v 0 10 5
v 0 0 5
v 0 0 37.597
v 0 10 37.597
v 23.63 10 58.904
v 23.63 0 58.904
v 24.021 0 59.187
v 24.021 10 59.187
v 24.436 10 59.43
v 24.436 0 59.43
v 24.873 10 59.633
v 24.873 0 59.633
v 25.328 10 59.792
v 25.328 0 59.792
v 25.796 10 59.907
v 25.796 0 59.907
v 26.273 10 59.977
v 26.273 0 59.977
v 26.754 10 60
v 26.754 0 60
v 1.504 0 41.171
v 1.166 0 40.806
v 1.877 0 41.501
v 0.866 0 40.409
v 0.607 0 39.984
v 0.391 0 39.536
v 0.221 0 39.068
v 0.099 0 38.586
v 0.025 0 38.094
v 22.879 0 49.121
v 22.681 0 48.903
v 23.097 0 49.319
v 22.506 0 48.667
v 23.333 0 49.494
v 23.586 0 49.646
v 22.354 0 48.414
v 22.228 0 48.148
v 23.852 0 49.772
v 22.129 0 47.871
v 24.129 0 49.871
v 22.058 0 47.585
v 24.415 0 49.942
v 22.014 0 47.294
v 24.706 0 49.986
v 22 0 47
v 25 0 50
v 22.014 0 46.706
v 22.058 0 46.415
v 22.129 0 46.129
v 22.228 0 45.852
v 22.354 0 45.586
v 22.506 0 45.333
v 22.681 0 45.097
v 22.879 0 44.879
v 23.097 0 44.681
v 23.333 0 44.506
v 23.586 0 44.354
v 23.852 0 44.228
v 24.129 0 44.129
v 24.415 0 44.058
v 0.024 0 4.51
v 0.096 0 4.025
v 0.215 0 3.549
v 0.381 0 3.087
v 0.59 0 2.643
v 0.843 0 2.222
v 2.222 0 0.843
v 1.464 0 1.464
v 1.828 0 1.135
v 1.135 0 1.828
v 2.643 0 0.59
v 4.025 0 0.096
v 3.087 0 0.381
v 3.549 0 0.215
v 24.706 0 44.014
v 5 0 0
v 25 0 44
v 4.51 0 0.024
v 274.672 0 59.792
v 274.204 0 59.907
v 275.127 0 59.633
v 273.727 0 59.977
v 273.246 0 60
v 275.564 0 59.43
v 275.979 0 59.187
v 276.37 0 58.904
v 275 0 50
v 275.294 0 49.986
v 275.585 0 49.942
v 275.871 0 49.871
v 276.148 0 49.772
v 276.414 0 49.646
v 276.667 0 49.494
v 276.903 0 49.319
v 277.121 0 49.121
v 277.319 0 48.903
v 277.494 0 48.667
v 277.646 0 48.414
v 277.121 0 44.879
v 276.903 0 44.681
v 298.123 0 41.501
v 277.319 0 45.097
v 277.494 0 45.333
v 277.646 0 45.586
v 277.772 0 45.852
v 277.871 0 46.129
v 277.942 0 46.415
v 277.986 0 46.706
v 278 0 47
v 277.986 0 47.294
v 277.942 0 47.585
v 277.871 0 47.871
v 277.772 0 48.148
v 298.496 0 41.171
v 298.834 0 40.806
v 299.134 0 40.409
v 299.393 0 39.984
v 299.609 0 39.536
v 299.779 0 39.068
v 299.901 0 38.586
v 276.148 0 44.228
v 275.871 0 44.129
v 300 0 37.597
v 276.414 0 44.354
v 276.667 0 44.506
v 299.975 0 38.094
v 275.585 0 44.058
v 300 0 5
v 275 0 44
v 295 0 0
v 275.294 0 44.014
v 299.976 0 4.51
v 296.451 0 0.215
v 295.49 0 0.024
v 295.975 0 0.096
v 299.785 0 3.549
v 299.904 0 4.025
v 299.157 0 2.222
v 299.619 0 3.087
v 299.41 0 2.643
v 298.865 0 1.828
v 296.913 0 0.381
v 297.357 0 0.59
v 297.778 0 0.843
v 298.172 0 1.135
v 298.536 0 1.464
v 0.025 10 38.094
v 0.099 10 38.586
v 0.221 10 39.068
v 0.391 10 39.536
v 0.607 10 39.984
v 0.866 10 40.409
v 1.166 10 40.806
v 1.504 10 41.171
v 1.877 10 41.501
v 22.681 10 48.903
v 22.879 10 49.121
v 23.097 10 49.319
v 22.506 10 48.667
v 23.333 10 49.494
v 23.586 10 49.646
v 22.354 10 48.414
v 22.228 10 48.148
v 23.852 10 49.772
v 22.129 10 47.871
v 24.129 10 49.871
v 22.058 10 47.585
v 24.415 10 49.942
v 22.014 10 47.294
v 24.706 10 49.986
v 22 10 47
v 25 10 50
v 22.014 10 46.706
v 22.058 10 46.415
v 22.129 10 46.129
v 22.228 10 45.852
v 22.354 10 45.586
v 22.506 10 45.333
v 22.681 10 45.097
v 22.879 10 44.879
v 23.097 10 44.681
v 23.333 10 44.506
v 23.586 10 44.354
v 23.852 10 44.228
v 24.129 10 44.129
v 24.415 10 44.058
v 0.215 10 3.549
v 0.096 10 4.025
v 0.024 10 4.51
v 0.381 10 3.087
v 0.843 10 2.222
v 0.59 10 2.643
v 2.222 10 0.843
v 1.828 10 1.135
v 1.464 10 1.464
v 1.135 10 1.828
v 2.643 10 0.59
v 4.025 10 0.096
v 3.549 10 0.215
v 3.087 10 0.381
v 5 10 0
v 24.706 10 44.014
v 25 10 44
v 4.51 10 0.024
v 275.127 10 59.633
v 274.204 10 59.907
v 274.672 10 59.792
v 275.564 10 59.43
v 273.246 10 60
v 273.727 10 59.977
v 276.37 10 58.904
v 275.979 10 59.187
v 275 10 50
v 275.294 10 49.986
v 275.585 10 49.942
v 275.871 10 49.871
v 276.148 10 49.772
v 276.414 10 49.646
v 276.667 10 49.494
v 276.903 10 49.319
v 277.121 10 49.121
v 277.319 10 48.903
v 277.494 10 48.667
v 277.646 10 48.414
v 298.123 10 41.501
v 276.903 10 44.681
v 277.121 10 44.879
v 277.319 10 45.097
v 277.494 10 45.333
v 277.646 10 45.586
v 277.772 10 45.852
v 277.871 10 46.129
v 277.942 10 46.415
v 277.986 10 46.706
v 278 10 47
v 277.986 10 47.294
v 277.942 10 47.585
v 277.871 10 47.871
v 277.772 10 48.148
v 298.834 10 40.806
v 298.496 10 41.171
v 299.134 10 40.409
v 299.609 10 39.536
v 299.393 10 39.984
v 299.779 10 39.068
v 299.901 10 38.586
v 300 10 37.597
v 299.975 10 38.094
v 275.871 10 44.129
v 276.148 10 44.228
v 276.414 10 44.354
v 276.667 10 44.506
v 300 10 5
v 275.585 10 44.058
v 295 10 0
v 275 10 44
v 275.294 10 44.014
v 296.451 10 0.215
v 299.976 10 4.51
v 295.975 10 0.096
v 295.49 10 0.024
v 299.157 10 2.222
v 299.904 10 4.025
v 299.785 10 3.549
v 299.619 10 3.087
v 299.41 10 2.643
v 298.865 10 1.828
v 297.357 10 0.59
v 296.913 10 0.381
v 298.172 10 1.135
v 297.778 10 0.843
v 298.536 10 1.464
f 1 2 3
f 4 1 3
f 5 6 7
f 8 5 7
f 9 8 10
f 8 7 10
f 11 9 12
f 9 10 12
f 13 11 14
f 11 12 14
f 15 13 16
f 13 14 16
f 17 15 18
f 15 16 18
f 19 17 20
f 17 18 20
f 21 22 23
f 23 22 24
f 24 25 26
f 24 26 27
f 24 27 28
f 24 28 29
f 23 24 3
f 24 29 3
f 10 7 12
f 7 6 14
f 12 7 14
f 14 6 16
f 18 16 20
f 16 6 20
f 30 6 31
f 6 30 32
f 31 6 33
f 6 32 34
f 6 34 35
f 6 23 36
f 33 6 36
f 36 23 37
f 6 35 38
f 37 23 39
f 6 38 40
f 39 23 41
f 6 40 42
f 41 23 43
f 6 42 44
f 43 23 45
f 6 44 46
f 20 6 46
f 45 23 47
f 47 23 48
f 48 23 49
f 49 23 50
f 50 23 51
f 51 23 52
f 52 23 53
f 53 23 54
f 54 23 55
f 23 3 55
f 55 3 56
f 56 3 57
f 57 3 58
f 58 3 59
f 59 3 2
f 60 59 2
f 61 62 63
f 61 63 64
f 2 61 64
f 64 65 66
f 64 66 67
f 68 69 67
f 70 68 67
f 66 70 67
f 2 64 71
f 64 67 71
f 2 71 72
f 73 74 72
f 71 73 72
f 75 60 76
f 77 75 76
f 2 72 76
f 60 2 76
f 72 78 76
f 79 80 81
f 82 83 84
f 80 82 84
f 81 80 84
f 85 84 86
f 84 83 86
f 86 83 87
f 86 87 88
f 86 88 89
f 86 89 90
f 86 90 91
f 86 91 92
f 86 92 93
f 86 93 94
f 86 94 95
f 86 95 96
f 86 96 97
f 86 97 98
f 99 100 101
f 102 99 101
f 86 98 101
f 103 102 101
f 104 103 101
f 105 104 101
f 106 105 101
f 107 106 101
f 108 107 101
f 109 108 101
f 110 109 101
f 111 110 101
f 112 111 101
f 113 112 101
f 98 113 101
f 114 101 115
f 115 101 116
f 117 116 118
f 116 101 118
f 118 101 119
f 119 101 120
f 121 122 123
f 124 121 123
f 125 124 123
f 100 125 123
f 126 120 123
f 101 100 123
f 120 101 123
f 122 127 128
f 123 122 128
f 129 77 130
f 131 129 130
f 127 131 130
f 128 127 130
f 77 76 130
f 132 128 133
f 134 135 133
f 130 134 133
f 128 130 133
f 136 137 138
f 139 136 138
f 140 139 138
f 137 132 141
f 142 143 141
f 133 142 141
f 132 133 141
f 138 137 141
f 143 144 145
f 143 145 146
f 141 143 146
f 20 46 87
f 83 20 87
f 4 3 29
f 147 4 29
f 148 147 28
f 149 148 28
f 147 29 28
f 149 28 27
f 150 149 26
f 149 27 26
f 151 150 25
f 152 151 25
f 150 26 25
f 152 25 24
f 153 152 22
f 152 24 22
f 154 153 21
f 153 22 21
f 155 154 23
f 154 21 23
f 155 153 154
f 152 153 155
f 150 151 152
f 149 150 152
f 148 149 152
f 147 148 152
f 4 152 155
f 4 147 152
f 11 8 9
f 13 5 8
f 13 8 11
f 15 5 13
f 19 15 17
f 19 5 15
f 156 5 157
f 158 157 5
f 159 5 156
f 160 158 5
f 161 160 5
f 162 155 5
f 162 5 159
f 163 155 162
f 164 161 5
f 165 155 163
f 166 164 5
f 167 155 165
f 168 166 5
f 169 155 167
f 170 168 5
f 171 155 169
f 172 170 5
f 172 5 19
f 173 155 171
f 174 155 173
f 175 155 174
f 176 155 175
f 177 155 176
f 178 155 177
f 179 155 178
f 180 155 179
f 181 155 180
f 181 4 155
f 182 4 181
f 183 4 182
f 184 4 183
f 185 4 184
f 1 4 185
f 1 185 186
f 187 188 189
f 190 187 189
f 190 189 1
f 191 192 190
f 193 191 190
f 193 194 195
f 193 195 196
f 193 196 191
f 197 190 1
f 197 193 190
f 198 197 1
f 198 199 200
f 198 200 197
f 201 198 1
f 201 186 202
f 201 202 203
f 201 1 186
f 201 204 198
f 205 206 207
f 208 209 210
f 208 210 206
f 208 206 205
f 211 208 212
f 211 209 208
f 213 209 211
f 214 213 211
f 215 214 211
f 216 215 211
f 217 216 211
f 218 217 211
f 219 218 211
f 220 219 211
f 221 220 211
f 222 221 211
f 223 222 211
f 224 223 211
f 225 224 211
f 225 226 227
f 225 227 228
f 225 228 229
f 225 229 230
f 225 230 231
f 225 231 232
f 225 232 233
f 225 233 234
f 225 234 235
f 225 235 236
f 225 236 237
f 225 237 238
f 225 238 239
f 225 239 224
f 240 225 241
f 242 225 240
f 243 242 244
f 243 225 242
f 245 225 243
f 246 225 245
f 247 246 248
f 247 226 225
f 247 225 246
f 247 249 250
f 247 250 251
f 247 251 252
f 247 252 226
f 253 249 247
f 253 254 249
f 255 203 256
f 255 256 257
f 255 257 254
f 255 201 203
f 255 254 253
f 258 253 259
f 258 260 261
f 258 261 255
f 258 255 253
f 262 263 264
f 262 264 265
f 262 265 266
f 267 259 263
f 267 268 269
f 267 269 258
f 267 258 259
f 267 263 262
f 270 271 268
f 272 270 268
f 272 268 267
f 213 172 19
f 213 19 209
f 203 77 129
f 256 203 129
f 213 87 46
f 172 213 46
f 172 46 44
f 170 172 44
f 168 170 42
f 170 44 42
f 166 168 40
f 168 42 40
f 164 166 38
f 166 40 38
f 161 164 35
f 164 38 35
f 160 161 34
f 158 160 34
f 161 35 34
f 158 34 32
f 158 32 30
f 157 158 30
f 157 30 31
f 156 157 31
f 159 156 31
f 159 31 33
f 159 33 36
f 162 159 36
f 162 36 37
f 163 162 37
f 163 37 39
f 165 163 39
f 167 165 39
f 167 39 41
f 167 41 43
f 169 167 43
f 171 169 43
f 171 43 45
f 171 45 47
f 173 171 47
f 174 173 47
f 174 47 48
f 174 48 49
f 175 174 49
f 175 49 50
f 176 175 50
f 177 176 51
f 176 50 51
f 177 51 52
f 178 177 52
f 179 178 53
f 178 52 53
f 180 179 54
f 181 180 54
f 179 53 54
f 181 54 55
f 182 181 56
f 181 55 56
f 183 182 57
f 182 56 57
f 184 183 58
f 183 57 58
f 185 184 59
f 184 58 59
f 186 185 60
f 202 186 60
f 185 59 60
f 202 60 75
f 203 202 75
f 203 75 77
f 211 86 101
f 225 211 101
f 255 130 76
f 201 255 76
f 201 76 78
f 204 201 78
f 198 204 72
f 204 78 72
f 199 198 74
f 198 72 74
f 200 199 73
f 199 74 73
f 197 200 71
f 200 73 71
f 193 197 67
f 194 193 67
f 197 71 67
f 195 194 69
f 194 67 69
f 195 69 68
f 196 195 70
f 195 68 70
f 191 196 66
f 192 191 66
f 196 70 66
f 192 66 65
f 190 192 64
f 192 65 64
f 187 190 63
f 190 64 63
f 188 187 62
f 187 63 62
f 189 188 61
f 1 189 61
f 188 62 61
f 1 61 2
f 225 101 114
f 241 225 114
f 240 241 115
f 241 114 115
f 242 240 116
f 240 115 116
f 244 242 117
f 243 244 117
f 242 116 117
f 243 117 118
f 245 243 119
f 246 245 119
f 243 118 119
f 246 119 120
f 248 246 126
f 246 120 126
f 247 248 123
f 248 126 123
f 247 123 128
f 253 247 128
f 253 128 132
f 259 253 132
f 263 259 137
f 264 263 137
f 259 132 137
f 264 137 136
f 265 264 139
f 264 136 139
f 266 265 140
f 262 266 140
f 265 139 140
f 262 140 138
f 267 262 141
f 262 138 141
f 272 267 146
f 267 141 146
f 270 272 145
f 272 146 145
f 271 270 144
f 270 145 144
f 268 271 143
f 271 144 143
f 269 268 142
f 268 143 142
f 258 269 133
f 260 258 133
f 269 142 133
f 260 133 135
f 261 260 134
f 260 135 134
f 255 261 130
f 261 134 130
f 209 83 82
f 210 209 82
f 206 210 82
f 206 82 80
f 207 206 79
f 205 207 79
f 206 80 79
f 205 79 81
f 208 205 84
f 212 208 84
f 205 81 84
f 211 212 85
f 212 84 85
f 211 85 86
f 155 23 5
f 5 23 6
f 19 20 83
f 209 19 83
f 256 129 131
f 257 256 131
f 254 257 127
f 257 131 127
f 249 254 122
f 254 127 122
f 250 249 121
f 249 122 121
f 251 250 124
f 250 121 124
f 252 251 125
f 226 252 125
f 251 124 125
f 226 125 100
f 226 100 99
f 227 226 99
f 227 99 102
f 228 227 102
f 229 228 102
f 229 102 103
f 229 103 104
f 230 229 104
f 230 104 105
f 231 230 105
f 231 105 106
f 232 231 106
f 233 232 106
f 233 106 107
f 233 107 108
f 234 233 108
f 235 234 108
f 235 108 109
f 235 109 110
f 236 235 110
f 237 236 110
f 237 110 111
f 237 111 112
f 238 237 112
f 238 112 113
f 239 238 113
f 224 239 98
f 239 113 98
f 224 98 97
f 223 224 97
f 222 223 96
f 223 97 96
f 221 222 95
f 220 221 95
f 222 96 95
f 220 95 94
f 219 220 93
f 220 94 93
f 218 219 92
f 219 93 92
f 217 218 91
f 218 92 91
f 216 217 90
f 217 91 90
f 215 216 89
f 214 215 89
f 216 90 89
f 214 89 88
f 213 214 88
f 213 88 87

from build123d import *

# Parameters (mm, degrees)
BOSS_EXTRUDE1_DEPTH     = 10
CUT_EXTRUDE4_DEPTH      = 11
CUT_EXTRUDE4_DEPTH_BACK = 1


with BuildPart() as part:
    # Sketch1 → Boss-Extrude1 (new body)
    with BuildSketch(Plane(origin=(0, 0, 0), x_dir=(1, 0, 0), z_dir=(0, 1, 0))):
        with BuildLine():
            Line((0, -5), (0, -37.596875763))
            ThreePointArc((0, -37.596875763), (0.493483818, -39.762819415), (1.876524762, -41.50121981))
            Line((1.876524762, -41.50121981), (23.630430059, -58.904344047))
            ThreePointArc((23.630430059, -58.904344047), (25.09887059, -59.718141596), (26.753905297, -60))
            Line((26.753905297, -60), (273.246094703, -60))
            ThreePointArc((273.246094703, -60), (274.90112941, -59.718141596), (276.369569941, -58.904344047))
            Line((276.369569941, -58.904344047), (298.123475238, -41.50121981))
            ThreePointArc((298.123475238, -41.50121981), (299.506516182, -39.762819415), (300, -37.596875763))
            Line((300, -37.596875763), (300, -5))
            ThreePointArc((300, -5), (298.535533906, -1.464466094), (295, 0))
            Line((295, 0), (5, 0))
            ThreePointArc((5, 0), (1.464466094, -1.464466094), (0, -5))
        make_face()
    extrude(amount=BOSS_EXTRUDE1_DEPTH)

    # Sketch2 → Cut-Extrude4 (cut, two sides)
    with BuildSketch(Plane(origin=(0, 0, 0), x_dir=(1, 0, 0), z_dir=(0, 1, 0))) as cut_extrude4_sk:
        with BuildLine():
            Line((25, -44), (275, -44))
            ThreePointArc((275, -44), (278, -47), (275, -50))
            Line((275, -50), (25, -50))
            ThreePointArc((25, -50), (22, -47), (25, -44))
        make_face()
    extrude(amount=CUT_EXTRUDE4_DEPTH, mode=Mode.SUBTRACT)
    extrude(cut_extrude4_sk.sketch, amount=-CUT_EXTRUDE4_DEPTH_BACK, mode=Mode.SUBTRACT)


solid = part.part
